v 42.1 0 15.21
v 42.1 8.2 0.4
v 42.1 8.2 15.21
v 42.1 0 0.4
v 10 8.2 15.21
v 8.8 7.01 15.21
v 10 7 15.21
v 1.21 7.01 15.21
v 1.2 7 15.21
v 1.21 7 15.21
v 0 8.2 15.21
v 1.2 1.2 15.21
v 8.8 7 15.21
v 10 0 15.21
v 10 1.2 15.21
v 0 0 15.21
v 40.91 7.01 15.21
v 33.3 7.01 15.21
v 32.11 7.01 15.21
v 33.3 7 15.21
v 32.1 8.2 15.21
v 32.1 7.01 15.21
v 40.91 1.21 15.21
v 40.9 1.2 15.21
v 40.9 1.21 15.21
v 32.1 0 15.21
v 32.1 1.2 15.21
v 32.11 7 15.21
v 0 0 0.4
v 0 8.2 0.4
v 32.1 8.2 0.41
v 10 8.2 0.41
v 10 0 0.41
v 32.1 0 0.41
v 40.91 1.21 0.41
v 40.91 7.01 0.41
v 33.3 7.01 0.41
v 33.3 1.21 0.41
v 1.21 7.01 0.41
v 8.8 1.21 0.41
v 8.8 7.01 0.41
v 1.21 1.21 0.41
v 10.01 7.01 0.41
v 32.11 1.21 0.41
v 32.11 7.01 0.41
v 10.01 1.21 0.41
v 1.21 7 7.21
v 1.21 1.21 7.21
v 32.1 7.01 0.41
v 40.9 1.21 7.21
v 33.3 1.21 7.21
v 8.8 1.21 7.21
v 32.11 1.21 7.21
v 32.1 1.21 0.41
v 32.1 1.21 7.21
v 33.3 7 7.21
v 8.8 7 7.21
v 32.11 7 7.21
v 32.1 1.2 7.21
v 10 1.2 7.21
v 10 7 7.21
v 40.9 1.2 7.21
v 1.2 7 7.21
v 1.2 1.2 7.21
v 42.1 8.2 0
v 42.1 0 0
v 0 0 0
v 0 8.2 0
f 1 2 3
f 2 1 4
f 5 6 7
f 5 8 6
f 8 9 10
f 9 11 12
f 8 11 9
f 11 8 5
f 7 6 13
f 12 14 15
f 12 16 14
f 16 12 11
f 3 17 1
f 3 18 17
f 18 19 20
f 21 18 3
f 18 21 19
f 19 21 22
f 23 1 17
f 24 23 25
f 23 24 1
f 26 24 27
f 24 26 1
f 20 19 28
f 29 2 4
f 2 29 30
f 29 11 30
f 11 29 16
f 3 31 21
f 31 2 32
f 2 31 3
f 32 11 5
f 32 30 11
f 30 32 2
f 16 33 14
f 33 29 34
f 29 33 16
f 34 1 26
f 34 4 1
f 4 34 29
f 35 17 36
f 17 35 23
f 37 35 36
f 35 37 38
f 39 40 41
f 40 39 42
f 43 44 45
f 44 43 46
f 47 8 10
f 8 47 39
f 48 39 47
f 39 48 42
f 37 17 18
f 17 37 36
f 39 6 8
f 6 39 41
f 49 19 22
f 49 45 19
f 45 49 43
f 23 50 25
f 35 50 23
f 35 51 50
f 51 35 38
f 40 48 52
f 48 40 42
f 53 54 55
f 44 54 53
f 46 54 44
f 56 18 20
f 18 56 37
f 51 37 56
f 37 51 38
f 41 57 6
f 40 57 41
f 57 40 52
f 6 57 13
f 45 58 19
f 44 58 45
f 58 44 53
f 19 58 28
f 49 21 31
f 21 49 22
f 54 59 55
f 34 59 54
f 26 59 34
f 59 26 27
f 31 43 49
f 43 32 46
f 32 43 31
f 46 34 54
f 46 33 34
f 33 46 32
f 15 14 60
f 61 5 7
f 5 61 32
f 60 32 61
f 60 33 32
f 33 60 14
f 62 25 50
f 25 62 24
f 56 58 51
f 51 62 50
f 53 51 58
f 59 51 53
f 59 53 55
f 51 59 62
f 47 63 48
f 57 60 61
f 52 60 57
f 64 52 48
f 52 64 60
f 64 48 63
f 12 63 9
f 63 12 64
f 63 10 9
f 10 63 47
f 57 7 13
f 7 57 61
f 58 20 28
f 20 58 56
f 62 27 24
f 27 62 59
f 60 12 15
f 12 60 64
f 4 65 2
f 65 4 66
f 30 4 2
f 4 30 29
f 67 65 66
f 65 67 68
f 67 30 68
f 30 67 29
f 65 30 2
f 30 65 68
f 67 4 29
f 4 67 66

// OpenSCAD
// file: ../../Base/Rotation.scad
// Fischertechnik Box Foundation
// Geometry Helpers Rotation

include <PlacementOptions.scad>

// getRotatedSpace(space, rotation=NoRotation)
// Rotates the space dependent on the specified rotation

function getRotatedSpace(space, rotation=NoRotation) = [
    (rotation == Rotate90 || rotation == Rotate270) ? space.y : space.x,
    (rotation == Rotate90 || rotation == Rotate270) ? space.x : space.y
];

// Rotates the given space around the fixed left lower corner
// space = the space the children needs as width/depth list [width,depth]
// rotation = 0 Rotate0 degrees, 1 Rotate90 degrees, 2 Rotate180 degrees, 3 Rotate270 degrees (equivalent to -90)

module RotateFix(space, rotation=NoRotation) {
    dy = (rotation == Rotate0 || rotation == Rotate270) ? 0 :
        (rotation == Rotate90) ? space.x :
        space.y;
    dx = (rotation < Rotate180) ? 0 :
        (rotation == Rotate180) ? space.x :
        space.y;
    
    translate([dx, dy, 0])
        rotate([0, 0, rotations[rotation]])
            children();
}
// file: ../../Base/Alignment.scad
// Fischertechnik Box Foundation
// Geometry Helpers Alignment

include <PlacementOptions.scad>

// getAlignedX(elementWidth, spaceWidth, align=AlignRight, offset=0)
// Gets the aligned X offset of an element with the given
// width in the given space.
// elementWidth = The width of the element to positon
// spaceWidth = The space where the element should be aligned
// align = 0 AlignLeft, 1 AlignCenter, 2 AlignRight
// offset = an optional offset from the aligned position. When
// aligned left or centered, then positive values are in X direction.
// When aligned right then positive values are in negative X direction.

function getAlignedX(elementWidth, spaceWidth, align=AlignRight, offset=0) =
    (align == AlignLeft) ?
        offset :
        ((align == AlignCenter) ?
        (spaceWidth - elementWidth)/2 + offset :
        spaceWidth - offset - elementWidth);

// getAlignedY(elementDepth, spaceDepth, align=AlignTop, offset=0)
// Gets the aligned Y offset of an element with the given
// depth in the given space.
// elementDepth = The depth of the element to positon
// spaceDepth = The space where the element should be aligned
// align = 0 AlignBottom, 1 AlignCenter, 2 AlignTop
// offset = an optional offset from the aligned position. When
// aligned bottom or centered, then positive values are in Y direction.
// When aligned top then positive values are in negative Y direction.

function getAlignedY(elementDepth, spaceDepth, align=AlignTop, offset=0) =
    (align == AlignBottom) ?
        offset :
        ((align == AlignCenter) ?
        (spaceDepth - elementDepth)/2 + offset :
        spaceDepth - offset - elementDepth);
// file: ../../Base/Boxes.scad
// Fischertechnik Box Foundation
// Pre-designed Boxes

use <Constants.scad>

include <PlacementOptions.scad>

box190Width = 190;
box190Depth = 130;
box130Width = 130;
box130Depth = 95;

// Values are from an original ec3 box
topBottomDifference = 1.5;
outerHeight = 40;
innerHeight = 38.2;
baseThickness = outerHeight - innerHeight;
stackExcess = 5.7;
radius = 3.5;
wallThickness = 1.5;
tolerance = 0.2;
stackOffset = innerHeight - stackExcess;

boxUsageHeight = stackOffset;
boxWallThickness = wallThickness;
boxBaseThickness = baseThickness;
boxWebWidth = 3.0;

// getBoxWallThickness()
// Gets the wall thickness of a Fischertechnik Box
function getBoxWallThickness() = boxWallThickness;

// getBoxUsageHeight()
// Gets the usable height of a Fischertechnik box
function getBoxUsageHeight() = boxUsageHeight;

// getBoxInnerHeight()
// Gets the inner height of a Fischertechnik box, including the stack excess
function getBoxInnerHeight() = innerHeight;

// getBoxBaseThickness()
// Gets the thickness of the Fischertechnik box base.
function getBoxBaseThickness() = boxBaseThickness;

// getBoxWebWidth()
// Gets the width of a box web
function getBoxWebWidth() = boxWebWidth;

// getBox190Space()
// Gets the usable inner space of a Box 190 as an x/y-list
function getBox190Space() = [
    box190Width - 2*getBoxWallThickness() - topBottomDifference, 
    box190Depth - 2*getBoxWallThickness() - topBottomDifference ];

// BoxBase(width, depth)
// Creates an empty stackable Fischertechnik compatible box
// width = Outer width of the box (190, 130, ...)
// depth = Outer depth of the box (130, 95, ...)

module BoxBase(width, depth, height=outerHeight) {    
    thinPlate = 0.01;

    innerHeight = height - baseThickness;    
    
    module BodyPlate(width, depth) {
        translate([radius, radius])
        hull() {
            w = width-2*radius;
            d = depth-2*radius;
            cube([w, d, thinPlate]);
            cylinder(thinPlate, r=radius, $fn=getFragments());
            translate([w, 0])
                cylinder(thinPlate, r=radius, $fn=getFragments());
            translate([w, d])
                cylinder(thinPlate, r=radius, $fn=getFragments());
            translate([0, d])
                cylinder(thinPlate, r=radius, $fn=getFragments());
        }
    }
    
    module Body(tolerance=tolerance) {
        hull() {
            // Bottom with tolerance to fit into the original boxes when stacked
            translate([-wallThickness+tolerance, -wallThickness+tolerance, -baseThickness])
                BodyPlate(width-topBottomDifference-2*tolerance, depth-topBottomDifference-2*tolerance);
            
            // Top
            translate([-wallThickness-topBottomDifference/2, -wallThickness-topBottomDifference/2, innerHeight-thinPlate])
                BodyPlate(width, depth);
         }
    }

    module Cutoff() {
        hull() {
            coWidth = width - 2*wallThickness;
            coDepth = depth - 2*wallThickness;
            
            // Bottom
            BodyPlate(coWidth-topBottomDifference, coDepth-topBottomDifference);

            // Top
            translate([-topBottomDifference/2, -topBottomDifference/2, innerHeight+thinPlate]) 
                BodyPlate(coWidth, coDepth);
        }
    }
    
    difference() {        
        Body();
        Cutoff();
        stackOffset = innerHeight - stackExcess;
        translate([0, 0, stackOffset + baseThickness])
            Body(tolerance=0);
    }
}

// Creates the Fischertechnik empty box 130x190 mm and places it at position 0,0
// 190x130 are the outer sizes, the inner space is slightly smaller. Use getBox190Space() to get the inner sizes.
// The box is positioned that the usable inner space is at the 0,0,0 position. The

module Box190() {
    BoxBase(box190Width, box190Depth);
}

// Gets the usable inner space of a Box 130 as an x/y-list
function getBox130Space() = [
    box130Width - 2*getBoxWallThickness() - topBottomDifference, 
    box130Depth - 2*getBoxWallThickness() - topBottomDifference ];

// Creates the Fischertechnik empty box 95x130 mm and places it at position 0,0
// 190x130 are the outer sizes, the inner space is slightly smaller. Use getBox190Space() to get the inner sizes.
// The box is positioned that the usable inner space is at the 0,0,0 position. The

module Box130() {
    BoxBase(box130Width, box130Depth);
}

// Creates a web at the specified box walls
// corner 0 = LowerLeft, 1 = UpperLeft, 2 = UpperRight, 3 = LowerRight
// side 0 = LeftOfCorner, 1 = RightOfCorner
// distance = Distance in mm from the corner
// boxSpace = inner width and depth of the box (default: Box 190)
// webWidth = length of the web (default is 3 mms)
// webThickness = thickness of the web (default is 1 mm)

module BoxWeb(corner, side, distance, boxSpace=getBox190Space(), webWidth=getBoxWebWidth(), webThickness=1.0) {
    sink = getBoxWallThickness()/2;

    width = (corner % 2 == 0) ? 
            (side == LeftOfCorner ? webWidth : webThickness) :
            (side == LeftOfCorner ? webThickness : webWidth);

    depth = (corner % 2 == 0) ? 
            (side == RightOfCorner ? webWidth : webThickness) :
            (side == RightOfCorner ? webThickness : webWidth);
    
    xDiff = corner == LowerLeft ? 
                (side == LeftOfCorner ? -sink : distance) :
            (corner == UpperLeft ?                
                (side == LeftOfCorner ? distance : -sink) :
            (corner == UpperRight ?
                (side == LeftOfCorner ? boxSpace.x-webWidth+sink : boxSpace.x-distance-webThickness) :
                (side == LeftOfCorner ? boxSpace.x-distance-webThickness: boxSpace.x-webWidth+sink)));

    yDiff = corner == LowerLeft ? 
                (side == RightOfCorner ? -sink : distance) :
            (corner == UpperLeft ?
                (side == RightOfCorner ? boxSpace.y-distance : boxSpace.y-webWidth+sink) :
            (corner == UpperRight ?
                (side == RightOfCorner ? boxSpace.y-webWidth+sink : boxSpace.y-distance) :
                (side == RightOfCorner ? distance : -sink)));
    
    translate([xDiff, yDiff, -getExcess()])
        cube([width, depth, boxUsageHeight + 2*getExcess()]);
}
// file: ../../Base/PlacementOptions.scad
// Fischertechnik Box Foundation
// Placement Options

// Alignment
NoAlign = 0;
AlignLeft = 1;
AlignBottom = 2;
AlignCenter = 3;
AlignRight = 4;
AlignTop = 5;

// Element rotation degree steps
rotations = [0, -90, -180, -270];

// Rotation
NoRotation = 0;
Rotate0 = 0;
Rotate90 = 1;
Rotate180 = 2;
Rotate270 = 3;

// Docking (seen from above)
NoDock = -1;
DockLeft = 0;
DockTop = 1;
DockRight = 2;
DockCorner = 2;
DockBottom = 3;

// Web corners
LowerLeft = 0;
UpperLeft = 1;
UpperRight = 2;
LowerRight = 3;

// Web position relative to corner
LeftOfCorner = 0;
RightOfCorner = 1;
// file: ../../Base/Placement.scad
// Fischertechnik Box Foundation
// Geometry Helpers Placement

use <Constants.scad>
use <Alignment.scad>
use <Rotation.scad>
use <Boxes.scad>

include <PlacementOptions.scad>

// Place(x=0, y=0, elementSpace=[0,0], alignX=AlignLeft, alignY=AlignBottom, rotation=Rotate0, boxSpace=getBox190Space())
// Places the child at the specified position
// y = Y-Position. This is a relative position when an X aligment is specified.
// x = X-Position. This is a relative position when an Y aligment is specified.
// elementSpace = space of the element to be placed [x,y]
// alignX = -1=NoAlign, 0 AlignLeft, 1 AlignCenter, 3 AlignRight (elementSpace and boxSpace required!)
// alignY = -1=NoAlign, 2 AlignBottom, 1 AlignCenter, 4 AlignTop (elementSpace and boxSpace required!)
// rotation = 0 Rotate0 0 degrees, 1 Rotate90 90 degrees, 
// 2 Rotate180 180 degrees, 3 Rotate270 270 degrees (equivalent to -90)
// boxSpace = Inner space of the box where the placement occurs [x,y] - default is Box 190x130 inner space

module Place(x=0, y=0, elementSpace=[0,0], 
  alignX=AlignLeft, alignY=AlignBottom, 
  rotation=NoRotation, boxSpace=getBox190Space()) {

    module Position(x, y, space, rotation=Rotate0) {
        translate([x, y, 0])
            RotateFix(space, rotation)
                children();
    }

    space = getRotatedSpace(elementSpace, rotation);
    alignedX = getAlignedX(space.x, boxSpace.x, alignX, x);
    alignedY = getAlignedY(space.y, boxSpace.y, alignY, y);
    Position(alignedX, alignedY, elementSpace, rotation)
        children();
}

// Center(space=getBox130Space(), elementSpace=[0,0])
// space = Space where the children is centered. For cylinder use centered=true and no elementSpace.
// elementSpace = space of the element to be centered [x,y]

module Center(space=getBox190Space(), elementSpace=[0,0]) {
    Place(elementSpace=elementSpace, boxSpace=space, alignX=AlignCenter, alignY=AlignCenter)
        children();
}

// CenterHorizontal(width=0, y=0, offset=0, space=getBox130Space())
// width = Width of the element to be placed.
// y = Y position of the element
// offset = Offset from the center position (negative will be left of the center)
// space = Space where the element is placed

module CenterHorizontal(width=0, y=0, offset=0, space=getBox190Space()) {
    Place(x=offset, y=y, elementSpace=[width, 0], boxSpace=space, alignX=AlignCenter)
        children(0);
}

// CenterVertical(depth=0, x=0, offset=0, space=getBox130Space())
// depth = Depth of the element to be placed.
// x = X position of the element
// offset = Offset from the center position (negative will be down of the center)
// space = Space where the element is placed

module CenterVertical(depth=0, x=0, offset=0, space=getBox190Space()) {
    Place(x=x, y=offset, elementSpace=[0, depth], boxSpace=space, alignY=AlignCenter)
        children(0);
}

// getIsVertical(align)
// True if the specified alignment needs a vertical orientation for a divider (AlignRight, AlignLeft)

function getIsVertical(align) = (align == AlignRight || align == AlignLeft);

// getIsHorizontal(align)
// True if the specified alignment needs a horizontal orientation for a divider (AlignTop, AlignBottom)

function getIsHorizontal(align) = (align == AlignTop || align == AlignBottom);
// file: ../../Elements/AxisClip10.scad
// Fischertechnik Box Library
// Axis for clip 10
// 31023

use <../ModelBase/Simple.scad>
use <../Base/Constants.scad>

width = 12;
depth = 12;
height = 23;
upperDiameter = 3.6;
clipHeight = 10;

// getAxisClip10Space()
// Gets the space of a frame for a clip 10 with spring ring (mot2)

function getAxisClip10Space() = [width, depth, height];

// AxisClip10(height, clipHeight)
// Axis for clip 10 with spring ring (mot2)
// height = Height of the complete axis
// clipHeight = Height of the rt for the clip (standard is 10, in mot3 its only 7)

module AxisClip10(height=height, clipHeight=clipHeight) {
    LeveledAxisWithSpace(height, height-clipHeight, getAxisClip10Space(), diameter=upperDiameter);
}

// Tests
color("lightgray")
AxisClip10();
// file: ../../Base/Constants.scad
// Fischertechnik Box Foundation
// Constants

// Constant values necessary for multiple elements

// Base constants
dividerThickness = 1.2;
excess = 0.01;
fragments = 90;
tolerance = 0.8;

// Gets the thickness of a divider 
function getDividerThickness() = dividerThickness;

// Gets the excess that is used to merge walls into each other
function getExcess() = excess;

// Gets amount of fragments of a cylinder
function getFragments() = fragments;

// Gets the inner tolerance of a frame to each side
function getTolerance() = tolerance;


// Fischertechnik specific constants
axisDiameter = 4;
axisBottomDiameter = axisDiameter + 1;
standardEdgeDistance = 2.5;
standardWebDistance = 11.5;
standardCornerLength = 15;
tubeWallFactor = 0.8;
smallPartsFrameHeight = 20;

// Gets axis diameter
function getAxisDiameter() = axisDiameter;

// Gets axis bottom diameter for thicker part at the bottom
function getAxisBottomDiameter() = axisBottomDiameter;

// gets the standard distance to the wall of the box for dockable frames with webs
function getStandardEdgeDistance() = standardEdgeDistance;

// gets the standard distance of each web to the corner of the dockable frame
function getStandardWebDistance() = standardWebDistance;

// gets the standard length of the corner walls of a dockable frame
function getStandardCornerLength() = standardCornerLength;

// gets the wall thickness of a tube.
function getTubeWallThickness() = tubeWallFactor * getDividerThickness();

// gets the frame height for docked small parts boxes.
function getSmallPartsFrameHeight() = smallPartsFrameHeight;
// file: ../../Elements/FrameTwoStrut30.scad
// Fischertechnik Box Library
// Frame for two Strut 30
// 38537

use <../ModelBase/Complex.scad>

width = 38.9;
depth = 5.8;
height = 14.8;

// getFrameTwoStrut30Space()
// Gets the space needed for the frame for two struts.
function getFrameTwoStrut30Space() = getElevatedFramesWithCutoffSpace([width, depth, height]);

// FrameTwoConnectors45()
// Frame for two struts 30

module FrameTwoStrut30() {    
    bearingLength = 8.8;
    loadHeight = 8.0;
    
    ElevatedFramesWithCutoff([width, depth, loadHeight], depth, height, bearingLength);
}

// Test
color("lightgray")
FrameTwoStrut30();
// file: ../TestPrint.scad
// 3D Print Test Base

use <../Base/Constants.scad>

use <../Elements/AxisClip10.scad>

module TestPrint(elementSpace) {
    cube([elementSpace.x, elementSpace.y, 0.4]);
    translate([0,0,0.4+getExcess()]) {
        children();
    }
}

TestPrint(getAxisClip10Space())
    AxisClip10();
// main file
// 3D Print Test
// FrameTwoStrut30

use <../TestPrint.scad>
use <../../Elements/FrameTwoStrut30.scad>

TestPrint(getFrameTwoStrut30Space())
    FrameTwoStrut30();
